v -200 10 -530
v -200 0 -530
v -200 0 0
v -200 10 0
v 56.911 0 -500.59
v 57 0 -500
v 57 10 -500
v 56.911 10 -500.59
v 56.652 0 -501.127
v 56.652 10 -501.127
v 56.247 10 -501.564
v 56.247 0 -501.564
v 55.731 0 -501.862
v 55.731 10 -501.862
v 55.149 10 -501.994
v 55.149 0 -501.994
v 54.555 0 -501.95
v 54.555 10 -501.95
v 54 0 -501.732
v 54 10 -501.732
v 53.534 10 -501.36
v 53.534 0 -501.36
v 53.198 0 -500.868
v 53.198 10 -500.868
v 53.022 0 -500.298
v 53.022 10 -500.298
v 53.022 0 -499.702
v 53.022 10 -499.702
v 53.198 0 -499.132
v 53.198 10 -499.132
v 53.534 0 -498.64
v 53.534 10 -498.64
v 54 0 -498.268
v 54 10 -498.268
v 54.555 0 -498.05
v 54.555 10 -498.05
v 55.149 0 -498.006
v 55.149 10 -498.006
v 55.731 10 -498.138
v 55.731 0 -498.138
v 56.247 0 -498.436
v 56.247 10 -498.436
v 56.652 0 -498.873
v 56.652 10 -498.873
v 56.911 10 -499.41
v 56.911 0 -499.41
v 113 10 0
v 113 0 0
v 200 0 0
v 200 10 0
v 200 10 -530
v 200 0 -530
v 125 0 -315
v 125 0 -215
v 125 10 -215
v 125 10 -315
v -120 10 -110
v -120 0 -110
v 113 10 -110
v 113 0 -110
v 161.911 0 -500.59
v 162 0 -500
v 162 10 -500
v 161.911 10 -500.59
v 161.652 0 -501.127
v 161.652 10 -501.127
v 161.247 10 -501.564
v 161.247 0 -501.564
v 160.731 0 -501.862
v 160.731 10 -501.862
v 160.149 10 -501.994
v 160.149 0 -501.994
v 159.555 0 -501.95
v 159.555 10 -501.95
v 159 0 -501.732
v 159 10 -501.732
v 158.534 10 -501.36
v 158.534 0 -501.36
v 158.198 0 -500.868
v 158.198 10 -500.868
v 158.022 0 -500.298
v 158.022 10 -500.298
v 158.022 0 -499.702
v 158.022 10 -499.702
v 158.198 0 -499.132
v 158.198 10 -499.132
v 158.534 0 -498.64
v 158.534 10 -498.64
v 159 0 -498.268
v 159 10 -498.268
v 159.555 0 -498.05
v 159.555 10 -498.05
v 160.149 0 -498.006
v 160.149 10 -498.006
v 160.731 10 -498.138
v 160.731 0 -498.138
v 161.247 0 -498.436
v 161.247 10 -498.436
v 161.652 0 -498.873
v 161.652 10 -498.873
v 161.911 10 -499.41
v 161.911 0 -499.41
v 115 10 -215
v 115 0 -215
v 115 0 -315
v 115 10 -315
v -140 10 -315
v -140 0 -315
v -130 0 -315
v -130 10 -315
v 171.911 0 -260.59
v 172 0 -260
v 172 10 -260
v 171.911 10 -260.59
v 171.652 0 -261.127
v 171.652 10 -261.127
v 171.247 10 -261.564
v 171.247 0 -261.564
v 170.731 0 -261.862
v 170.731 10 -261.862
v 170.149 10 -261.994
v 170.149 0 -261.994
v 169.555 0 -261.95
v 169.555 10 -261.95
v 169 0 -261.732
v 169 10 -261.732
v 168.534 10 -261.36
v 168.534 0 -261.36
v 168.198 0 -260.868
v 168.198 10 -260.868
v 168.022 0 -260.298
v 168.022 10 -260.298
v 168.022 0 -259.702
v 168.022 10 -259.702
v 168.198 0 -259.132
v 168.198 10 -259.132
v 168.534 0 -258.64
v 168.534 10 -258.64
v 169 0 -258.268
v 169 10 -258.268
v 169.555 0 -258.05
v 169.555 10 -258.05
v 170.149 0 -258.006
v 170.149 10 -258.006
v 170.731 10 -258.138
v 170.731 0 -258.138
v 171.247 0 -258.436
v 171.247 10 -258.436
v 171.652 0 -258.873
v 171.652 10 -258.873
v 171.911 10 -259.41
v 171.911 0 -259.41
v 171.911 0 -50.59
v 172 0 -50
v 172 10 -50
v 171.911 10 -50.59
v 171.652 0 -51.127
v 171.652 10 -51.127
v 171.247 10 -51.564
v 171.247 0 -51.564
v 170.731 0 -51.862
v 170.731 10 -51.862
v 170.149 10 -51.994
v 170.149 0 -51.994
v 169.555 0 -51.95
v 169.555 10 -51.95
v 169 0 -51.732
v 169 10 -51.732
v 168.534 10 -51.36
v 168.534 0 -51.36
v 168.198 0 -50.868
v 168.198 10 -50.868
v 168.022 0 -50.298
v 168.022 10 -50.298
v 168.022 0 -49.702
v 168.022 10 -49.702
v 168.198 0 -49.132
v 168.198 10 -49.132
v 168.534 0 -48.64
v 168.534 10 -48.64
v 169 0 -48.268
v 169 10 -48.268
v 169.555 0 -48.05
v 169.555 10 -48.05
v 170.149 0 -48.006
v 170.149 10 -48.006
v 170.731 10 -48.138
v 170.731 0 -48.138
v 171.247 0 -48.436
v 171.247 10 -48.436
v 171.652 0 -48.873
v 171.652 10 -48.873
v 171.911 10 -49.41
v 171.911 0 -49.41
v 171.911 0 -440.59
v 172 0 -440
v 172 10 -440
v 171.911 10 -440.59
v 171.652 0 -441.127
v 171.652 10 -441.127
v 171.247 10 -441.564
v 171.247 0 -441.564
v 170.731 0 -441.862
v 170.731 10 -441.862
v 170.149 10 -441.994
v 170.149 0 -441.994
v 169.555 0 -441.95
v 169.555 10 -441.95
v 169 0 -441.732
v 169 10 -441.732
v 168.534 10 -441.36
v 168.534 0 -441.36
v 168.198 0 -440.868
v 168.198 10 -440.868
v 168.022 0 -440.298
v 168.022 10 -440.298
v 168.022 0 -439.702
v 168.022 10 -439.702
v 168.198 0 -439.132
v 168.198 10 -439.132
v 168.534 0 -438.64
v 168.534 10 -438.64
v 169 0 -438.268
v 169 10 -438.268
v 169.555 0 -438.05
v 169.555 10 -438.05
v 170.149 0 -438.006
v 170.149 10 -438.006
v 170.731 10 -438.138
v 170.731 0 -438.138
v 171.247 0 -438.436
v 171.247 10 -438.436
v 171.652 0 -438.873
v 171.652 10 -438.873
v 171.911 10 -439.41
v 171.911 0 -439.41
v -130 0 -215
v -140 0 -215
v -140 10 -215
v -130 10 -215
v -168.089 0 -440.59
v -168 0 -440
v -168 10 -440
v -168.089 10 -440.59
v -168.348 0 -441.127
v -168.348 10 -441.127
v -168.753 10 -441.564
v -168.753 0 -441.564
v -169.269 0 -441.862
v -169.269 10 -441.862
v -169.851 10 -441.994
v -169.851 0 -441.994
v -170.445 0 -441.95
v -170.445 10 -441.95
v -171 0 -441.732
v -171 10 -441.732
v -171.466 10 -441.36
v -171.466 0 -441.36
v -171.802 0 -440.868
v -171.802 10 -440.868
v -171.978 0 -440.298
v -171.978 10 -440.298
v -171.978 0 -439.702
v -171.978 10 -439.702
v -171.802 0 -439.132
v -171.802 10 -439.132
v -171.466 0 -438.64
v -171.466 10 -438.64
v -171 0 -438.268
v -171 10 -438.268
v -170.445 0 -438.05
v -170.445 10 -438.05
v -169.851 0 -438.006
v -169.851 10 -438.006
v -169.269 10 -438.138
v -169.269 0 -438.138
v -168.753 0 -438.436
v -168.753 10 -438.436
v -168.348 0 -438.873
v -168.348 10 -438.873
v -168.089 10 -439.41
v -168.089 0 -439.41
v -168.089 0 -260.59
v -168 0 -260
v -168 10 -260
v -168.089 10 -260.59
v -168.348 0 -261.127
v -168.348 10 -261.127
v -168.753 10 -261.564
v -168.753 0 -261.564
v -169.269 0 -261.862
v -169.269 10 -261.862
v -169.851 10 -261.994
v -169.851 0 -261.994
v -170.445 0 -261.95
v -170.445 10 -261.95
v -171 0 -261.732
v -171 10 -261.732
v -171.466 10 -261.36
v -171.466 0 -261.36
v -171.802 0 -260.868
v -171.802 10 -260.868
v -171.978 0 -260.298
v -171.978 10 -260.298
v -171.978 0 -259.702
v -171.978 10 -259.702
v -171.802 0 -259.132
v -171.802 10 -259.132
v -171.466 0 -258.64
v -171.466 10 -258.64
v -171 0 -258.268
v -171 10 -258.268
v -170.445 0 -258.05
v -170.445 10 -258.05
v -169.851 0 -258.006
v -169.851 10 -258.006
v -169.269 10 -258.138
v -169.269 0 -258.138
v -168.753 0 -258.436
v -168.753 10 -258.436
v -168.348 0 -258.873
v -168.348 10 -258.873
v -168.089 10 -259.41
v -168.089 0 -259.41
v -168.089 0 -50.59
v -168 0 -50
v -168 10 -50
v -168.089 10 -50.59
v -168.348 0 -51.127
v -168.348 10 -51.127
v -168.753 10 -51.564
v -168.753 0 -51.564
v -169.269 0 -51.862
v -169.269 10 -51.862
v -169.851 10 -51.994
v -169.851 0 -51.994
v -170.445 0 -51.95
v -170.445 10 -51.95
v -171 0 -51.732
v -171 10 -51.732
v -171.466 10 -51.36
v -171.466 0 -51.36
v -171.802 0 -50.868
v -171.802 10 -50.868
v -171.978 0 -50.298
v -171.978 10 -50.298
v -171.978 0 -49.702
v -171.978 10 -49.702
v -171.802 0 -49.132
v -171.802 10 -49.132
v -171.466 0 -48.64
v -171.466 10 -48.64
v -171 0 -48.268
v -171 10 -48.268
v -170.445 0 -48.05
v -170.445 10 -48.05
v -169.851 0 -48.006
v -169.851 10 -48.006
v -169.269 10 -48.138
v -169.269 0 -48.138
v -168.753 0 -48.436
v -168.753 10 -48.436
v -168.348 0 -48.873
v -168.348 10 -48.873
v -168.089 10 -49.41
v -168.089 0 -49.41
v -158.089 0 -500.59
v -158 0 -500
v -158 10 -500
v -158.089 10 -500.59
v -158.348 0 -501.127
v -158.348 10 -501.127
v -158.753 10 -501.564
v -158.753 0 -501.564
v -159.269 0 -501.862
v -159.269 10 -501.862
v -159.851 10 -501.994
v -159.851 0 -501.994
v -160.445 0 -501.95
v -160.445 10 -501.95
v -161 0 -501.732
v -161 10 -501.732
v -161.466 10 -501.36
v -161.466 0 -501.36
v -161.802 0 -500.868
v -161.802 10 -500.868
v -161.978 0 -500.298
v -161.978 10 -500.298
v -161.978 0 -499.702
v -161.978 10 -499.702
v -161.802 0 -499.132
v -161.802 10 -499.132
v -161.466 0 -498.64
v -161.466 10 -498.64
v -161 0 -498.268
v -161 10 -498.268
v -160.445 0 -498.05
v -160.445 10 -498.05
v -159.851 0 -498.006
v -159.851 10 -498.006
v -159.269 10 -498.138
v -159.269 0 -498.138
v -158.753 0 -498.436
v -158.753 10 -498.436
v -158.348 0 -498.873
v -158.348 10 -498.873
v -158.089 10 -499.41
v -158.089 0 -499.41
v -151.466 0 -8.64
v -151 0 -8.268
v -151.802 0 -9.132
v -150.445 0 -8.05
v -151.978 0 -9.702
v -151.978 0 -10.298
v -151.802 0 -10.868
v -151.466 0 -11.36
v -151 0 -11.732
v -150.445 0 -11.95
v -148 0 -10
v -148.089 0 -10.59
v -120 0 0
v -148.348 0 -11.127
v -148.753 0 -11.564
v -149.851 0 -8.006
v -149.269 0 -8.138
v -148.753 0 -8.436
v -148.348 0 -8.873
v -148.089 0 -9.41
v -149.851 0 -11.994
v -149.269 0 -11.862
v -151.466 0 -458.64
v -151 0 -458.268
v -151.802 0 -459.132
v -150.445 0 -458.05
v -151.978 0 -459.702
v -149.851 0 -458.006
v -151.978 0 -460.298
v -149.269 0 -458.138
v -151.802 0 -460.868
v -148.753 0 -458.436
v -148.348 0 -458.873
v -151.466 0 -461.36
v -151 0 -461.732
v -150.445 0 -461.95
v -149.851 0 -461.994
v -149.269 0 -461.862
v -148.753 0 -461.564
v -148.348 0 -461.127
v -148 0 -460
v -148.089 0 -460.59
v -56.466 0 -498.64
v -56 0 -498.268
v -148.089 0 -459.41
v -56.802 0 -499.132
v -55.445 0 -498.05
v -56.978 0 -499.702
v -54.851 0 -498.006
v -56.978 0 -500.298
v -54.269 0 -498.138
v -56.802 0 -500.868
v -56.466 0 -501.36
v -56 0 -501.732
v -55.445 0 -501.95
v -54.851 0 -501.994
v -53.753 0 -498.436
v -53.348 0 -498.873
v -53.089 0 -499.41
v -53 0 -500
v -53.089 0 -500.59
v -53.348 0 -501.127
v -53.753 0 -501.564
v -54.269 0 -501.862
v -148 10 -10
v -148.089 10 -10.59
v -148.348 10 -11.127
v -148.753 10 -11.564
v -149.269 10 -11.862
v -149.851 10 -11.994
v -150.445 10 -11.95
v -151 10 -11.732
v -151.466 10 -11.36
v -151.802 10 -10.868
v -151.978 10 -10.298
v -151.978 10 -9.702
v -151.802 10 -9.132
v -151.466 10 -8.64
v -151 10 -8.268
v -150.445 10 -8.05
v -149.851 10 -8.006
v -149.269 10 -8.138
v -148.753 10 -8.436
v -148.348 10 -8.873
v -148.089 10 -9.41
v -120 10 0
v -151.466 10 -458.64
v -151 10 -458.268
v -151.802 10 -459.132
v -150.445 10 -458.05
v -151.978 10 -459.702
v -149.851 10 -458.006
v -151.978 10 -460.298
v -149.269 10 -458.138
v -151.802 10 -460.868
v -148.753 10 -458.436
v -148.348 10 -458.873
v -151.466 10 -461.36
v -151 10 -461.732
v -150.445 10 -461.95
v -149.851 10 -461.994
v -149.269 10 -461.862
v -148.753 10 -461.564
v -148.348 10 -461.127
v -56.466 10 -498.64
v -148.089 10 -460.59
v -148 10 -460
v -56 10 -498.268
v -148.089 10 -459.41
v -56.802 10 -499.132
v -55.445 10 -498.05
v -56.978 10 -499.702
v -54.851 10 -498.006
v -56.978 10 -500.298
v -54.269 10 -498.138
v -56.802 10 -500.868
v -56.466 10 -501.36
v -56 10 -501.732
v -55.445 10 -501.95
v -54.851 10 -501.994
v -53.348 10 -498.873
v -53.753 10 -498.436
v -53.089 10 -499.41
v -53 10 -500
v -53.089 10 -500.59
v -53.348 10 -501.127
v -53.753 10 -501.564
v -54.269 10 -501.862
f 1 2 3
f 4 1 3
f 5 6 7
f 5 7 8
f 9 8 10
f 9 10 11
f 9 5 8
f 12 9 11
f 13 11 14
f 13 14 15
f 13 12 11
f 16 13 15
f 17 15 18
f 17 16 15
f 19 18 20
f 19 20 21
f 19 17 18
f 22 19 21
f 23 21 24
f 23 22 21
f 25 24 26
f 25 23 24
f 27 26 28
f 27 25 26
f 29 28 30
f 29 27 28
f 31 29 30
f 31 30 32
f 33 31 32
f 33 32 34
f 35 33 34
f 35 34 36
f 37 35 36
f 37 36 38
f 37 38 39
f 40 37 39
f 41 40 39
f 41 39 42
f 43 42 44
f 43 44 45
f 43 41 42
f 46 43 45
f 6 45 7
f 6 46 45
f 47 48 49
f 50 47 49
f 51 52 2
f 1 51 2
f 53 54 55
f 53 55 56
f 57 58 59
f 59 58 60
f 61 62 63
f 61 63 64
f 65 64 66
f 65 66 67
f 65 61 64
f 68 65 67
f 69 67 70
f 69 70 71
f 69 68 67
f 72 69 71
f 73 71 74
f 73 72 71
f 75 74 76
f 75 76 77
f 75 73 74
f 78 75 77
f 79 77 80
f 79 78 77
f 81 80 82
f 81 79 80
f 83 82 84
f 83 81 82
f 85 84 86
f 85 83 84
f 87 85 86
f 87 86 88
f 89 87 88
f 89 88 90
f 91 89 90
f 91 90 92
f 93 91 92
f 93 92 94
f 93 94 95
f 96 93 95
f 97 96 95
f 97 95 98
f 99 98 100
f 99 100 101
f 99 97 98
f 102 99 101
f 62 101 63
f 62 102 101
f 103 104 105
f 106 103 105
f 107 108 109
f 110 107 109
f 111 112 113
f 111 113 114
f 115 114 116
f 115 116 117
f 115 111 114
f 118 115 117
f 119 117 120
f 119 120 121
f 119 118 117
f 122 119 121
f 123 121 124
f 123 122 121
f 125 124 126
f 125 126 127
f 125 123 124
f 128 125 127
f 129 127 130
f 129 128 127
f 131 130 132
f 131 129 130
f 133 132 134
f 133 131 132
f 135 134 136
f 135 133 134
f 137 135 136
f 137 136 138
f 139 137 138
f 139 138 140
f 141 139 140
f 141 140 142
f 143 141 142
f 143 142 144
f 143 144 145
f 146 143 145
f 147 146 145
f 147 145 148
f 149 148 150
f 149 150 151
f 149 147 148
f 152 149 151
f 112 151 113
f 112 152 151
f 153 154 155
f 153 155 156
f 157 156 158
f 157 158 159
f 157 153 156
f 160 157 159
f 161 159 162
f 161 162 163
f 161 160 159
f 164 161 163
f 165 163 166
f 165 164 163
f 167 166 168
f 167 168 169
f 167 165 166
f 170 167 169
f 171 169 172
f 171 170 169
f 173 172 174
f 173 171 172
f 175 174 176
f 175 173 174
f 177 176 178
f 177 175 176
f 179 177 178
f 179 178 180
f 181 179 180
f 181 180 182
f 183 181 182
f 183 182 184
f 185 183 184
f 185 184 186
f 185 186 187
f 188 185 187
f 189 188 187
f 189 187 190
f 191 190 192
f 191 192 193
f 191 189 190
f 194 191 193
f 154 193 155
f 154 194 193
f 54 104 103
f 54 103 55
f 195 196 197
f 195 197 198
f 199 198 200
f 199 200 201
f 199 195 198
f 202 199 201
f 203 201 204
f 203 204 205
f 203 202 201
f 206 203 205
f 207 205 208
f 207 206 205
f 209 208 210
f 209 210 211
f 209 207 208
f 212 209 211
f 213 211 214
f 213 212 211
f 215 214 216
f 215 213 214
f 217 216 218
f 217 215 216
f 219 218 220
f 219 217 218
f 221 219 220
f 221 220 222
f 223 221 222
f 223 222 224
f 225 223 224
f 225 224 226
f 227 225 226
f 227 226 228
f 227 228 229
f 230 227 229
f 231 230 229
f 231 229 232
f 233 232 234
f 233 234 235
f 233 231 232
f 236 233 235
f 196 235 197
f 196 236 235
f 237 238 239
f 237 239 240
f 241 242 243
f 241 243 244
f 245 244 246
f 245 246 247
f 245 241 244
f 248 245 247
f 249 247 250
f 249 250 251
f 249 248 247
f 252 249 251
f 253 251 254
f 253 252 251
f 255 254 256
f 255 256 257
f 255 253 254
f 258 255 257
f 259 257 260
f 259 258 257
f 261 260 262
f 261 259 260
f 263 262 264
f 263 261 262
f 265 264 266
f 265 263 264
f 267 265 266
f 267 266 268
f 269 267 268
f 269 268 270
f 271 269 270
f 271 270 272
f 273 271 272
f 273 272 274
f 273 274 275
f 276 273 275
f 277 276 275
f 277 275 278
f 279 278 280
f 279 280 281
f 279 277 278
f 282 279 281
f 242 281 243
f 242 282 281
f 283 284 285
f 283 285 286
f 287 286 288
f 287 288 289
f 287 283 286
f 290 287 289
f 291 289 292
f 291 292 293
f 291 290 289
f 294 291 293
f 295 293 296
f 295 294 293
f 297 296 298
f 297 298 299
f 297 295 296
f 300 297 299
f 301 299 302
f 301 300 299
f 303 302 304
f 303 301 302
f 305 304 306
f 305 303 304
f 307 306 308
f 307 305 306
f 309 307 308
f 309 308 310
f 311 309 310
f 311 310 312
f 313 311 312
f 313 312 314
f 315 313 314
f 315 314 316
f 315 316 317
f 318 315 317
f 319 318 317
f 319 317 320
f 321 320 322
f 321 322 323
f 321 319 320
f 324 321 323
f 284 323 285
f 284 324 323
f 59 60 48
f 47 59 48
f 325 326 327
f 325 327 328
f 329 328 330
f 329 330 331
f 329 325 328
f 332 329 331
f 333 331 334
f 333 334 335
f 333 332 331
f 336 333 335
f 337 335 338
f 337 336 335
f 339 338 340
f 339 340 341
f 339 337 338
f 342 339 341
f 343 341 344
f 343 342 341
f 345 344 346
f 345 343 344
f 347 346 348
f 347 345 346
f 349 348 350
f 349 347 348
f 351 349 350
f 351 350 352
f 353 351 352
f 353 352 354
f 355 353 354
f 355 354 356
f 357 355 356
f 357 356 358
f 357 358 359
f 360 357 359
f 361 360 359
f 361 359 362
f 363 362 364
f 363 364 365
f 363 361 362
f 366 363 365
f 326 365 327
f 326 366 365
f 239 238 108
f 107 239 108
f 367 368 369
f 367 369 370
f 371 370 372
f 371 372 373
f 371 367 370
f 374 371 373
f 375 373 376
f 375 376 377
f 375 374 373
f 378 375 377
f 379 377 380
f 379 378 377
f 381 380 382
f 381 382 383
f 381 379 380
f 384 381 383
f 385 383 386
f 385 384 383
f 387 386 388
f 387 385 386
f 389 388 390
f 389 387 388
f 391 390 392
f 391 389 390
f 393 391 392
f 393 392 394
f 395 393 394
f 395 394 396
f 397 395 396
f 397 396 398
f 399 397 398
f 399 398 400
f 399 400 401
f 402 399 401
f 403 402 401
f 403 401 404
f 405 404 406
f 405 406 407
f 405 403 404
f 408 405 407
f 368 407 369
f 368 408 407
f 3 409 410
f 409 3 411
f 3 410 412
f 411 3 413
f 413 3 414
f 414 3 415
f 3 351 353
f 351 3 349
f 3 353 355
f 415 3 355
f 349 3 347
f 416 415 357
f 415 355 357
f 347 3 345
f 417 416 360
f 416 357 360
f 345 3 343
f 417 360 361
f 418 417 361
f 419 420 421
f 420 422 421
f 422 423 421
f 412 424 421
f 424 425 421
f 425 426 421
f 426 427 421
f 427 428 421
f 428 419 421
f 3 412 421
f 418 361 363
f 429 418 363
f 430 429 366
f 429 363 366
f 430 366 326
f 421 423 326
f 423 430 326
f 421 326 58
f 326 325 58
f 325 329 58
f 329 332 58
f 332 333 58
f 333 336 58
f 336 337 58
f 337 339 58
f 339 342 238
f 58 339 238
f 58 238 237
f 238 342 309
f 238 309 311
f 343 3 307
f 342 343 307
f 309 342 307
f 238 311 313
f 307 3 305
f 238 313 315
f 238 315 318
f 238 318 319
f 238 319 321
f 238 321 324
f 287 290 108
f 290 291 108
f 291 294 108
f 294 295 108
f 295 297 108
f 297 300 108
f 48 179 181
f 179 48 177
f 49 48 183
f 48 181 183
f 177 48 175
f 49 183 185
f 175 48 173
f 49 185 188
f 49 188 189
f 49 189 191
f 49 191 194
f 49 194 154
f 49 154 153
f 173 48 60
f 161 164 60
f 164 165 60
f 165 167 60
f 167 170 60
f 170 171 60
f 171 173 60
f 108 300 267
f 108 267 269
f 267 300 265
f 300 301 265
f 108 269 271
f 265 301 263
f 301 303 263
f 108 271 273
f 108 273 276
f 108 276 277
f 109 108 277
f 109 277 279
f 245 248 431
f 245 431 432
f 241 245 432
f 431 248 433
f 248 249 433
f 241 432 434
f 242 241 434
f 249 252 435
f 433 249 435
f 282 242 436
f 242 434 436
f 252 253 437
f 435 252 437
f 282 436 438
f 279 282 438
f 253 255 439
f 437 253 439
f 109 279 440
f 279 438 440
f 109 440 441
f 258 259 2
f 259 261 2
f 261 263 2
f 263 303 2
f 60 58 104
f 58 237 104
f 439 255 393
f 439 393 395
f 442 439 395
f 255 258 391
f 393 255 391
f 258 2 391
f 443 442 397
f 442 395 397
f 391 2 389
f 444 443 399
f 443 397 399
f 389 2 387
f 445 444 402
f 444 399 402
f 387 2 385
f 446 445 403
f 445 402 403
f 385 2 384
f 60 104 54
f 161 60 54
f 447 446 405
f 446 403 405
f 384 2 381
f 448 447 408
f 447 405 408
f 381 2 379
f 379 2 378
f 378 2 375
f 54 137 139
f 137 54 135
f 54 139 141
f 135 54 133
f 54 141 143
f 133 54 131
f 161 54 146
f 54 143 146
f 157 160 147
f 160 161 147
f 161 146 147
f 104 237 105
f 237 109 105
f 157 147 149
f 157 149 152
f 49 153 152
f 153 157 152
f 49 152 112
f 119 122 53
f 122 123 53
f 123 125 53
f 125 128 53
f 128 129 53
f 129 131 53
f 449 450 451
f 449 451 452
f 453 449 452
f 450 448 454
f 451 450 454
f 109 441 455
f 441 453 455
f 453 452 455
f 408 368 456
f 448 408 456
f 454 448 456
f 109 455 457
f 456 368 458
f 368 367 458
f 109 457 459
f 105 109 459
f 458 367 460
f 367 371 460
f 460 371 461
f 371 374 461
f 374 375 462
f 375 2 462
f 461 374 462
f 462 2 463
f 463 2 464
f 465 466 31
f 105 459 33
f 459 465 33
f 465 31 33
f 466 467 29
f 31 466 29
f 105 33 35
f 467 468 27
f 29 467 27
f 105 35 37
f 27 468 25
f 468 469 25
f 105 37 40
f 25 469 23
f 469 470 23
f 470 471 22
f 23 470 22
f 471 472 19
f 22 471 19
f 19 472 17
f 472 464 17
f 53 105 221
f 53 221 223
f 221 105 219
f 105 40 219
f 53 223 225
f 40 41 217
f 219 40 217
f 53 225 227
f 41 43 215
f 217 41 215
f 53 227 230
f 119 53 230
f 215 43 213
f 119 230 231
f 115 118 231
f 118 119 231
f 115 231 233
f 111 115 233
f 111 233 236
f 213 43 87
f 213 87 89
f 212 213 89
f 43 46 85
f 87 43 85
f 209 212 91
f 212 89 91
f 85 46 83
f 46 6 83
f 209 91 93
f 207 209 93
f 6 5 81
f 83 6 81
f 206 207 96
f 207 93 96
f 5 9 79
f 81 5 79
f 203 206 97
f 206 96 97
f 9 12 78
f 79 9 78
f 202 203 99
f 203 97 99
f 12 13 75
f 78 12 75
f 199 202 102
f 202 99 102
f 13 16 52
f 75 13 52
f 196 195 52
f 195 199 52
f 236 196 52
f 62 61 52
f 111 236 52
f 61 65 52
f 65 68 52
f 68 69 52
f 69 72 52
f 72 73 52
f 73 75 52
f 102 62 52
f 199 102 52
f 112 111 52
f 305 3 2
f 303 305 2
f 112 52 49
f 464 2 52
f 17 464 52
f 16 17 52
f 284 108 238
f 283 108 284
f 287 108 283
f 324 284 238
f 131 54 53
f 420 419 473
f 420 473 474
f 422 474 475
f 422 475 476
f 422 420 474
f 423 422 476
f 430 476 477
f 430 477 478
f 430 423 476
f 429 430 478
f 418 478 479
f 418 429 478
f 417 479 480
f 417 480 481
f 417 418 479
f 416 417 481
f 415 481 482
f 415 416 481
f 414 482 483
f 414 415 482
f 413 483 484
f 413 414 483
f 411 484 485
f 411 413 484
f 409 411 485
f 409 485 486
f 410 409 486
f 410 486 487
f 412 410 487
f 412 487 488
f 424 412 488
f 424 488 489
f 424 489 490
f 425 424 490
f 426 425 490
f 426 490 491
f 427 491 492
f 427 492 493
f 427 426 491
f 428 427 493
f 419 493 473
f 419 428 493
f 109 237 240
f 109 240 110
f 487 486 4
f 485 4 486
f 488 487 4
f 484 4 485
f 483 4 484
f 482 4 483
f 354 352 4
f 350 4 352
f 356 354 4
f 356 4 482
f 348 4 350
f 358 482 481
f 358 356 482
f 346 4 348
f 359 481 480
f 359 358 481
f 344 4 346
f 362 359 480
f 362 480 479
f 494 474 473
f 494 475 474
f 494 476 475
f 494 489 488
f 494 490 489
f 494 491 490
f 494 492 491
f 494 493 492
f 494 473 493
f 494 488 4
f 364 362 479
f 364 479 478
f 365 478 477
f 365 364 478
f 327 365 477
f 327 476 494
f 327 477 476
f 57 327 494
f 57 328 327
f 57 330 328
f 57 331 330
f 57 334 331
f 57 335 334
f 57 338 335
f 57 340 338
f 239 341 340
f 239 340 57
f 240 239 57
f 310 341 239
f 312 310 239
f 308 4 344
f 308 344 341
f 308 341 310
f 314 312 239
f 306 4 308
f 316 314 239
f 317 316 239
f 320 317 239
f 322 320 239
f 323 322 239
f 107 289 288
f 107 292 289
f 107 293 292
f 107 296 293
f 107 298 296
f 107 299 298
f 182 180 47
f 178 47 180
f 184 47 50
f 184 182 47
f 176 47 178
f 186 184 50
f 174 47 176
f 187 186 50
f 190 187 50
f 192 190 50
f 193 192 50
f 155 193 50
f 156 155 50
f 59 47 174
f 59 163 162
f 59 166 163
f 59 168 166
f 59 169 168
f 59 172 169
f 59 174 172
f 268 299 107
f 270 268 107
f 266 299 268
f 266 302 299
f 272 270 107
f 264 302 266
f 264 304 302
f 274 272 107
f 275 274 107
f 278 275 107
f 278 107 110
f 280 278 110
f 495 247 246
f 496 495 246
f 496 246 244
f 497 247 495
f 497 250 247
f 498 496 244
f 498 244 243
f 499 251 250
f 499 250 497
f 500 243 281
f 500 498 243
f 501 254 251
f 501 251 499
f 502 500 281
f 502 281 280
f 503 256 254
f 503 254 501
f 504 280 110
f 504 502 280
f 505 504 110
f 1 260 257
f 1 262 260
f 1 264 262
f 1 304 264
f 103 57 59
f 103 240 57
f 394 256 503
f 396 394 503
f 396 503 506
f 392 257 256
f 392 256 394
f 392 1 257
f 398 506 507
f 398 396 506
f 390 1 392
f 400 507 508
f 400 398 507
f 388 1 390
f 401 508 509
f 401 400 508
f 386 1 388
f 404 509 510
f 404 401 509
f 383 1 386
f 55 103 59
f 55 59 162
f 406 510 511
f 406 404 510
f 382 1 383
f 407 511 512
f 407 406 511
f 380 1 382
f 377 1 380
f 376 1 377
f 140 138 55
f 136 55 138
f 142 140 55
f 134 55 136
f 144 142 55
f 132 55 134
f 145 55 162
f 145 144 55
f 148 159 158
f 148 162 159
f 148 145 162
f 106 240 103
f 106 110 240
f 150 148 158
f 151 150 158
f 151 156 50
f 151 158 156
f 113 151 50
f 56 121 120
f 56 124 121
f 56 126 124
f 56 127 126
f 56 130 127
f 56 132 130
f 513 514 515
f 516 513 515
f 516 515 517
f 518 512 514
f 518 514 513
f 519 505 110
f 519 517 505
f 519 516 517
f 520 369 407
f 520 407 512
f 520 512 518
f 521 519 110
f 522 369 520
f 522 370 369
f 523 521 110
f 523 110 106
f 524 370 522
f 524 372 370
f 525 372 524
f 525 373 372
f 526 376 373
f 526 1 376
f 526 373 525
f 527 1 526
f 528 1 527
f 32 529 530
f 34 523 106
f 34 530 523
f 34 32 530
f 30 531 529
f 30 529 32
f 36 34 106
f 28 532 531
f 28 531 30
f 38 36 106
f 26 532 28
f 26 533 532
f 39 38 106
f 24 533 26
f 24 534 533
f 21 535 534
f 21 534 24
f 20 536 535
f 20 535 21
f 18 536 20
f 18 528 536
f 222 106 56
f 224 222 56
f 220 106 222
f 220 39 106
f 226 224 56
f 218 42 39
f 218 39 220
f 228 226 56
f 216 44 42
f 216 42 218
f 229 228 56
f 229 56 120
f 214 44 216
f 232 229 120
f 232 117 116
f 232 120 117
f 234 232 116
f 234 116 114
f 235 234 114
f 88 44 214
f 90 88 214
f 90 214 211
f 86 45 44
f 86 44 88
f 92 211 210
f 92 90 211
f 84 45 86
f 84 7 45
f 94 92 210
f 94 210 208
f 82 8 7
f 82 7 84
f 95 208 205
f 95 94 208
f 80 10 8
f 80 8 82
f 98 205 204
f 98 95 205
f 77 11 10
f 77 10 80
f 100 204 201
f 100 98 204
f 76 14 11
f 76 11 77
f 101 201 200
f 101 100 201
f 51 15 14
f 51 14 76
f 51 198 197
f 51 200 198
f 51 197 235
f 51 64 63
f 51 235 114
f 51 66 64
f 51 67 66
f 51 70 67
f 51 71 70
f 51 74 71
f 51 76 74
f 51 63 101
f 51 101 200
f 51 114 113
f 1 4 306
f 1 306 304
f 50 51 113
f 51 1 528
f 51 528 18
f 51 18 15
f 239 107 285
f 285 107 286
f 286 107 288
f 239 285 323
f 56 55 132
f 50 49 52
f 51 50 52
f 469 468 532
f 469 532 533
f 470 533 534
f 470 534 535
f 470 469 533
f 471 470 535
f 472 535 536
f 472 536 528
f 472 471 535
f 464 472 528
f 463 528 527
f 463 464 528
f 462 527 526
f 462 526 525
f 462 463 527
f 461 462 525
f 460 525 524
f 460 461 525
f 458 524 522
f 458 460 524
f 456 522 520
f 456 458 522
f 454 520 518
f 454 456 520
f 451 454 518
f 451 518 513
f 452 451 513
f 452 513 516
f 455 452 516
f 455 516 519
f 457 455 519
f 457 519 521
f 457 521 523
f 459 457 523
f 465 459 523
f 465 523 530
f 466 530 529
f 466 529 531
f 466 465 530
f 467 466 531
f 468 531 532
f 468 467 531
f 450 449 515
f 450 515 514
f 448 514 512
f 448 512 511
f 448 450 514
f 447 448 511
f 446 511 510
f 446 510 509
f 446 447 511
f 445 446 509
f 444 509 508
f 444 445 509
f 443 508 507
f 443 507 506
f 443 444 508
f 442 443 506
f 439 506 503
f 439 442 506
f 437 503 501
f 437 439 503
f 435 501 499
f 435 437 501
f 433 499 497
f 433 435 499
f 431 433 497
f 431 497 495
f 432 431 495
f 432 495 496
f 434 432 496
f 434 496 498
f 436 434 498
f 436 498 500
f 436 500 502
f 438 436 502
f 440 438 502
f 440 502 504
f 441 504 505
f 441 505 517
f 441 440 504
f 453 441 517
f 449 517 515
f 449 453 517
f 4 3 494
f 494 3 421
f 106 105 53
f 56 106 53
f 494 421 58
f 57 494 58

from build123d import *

# Parameters (mm, degrees)
SKETCH1_R           = 2
SKETCH1_W           = 10
SKETCH1_H           = 100
BOSS_EXTRUDE1_DEPTH = 10


with BuildPart() as part:
    # Sketch1 → Boss-Extrude1 (new body)
    with BuildSketch(Plane(origin=(0, 0, 0), x_dir=(1, 0, 0), z_dir=(0, 1, 0))):
        Polygon((-200, 530), (-200, 0), (-120, 0), (-120, 110), (113, 110), (113, 0), (200, 0), (200, 530), align=None)
        with Locations((-160, 500)):
            Circle(SKETCH1_R, mode=Mode.SUBTRACT)
        with Locations((-55, 500)):
            Circle(SKETCH1_R, mode=Mode.SUBTRACT)
        with Locations((55, 500)):
            Circle(SKETCH1_R, mode=Mode.SUBTRACT)
        with Locations((160, 500)):
            Circle(SKETCH1_R, mode=Mode.SUBTRACT)
        with Locations((-170, 50)):
            Circle(SKETCH1_R, mode=Mode.SUBTRACT)
        with Locations((-170, 260)):
            Circle(SKETCH1_R, mode=Mode.SUBTRACT)
        with Locations((-170, 440)):
            Circle(SKETCH1_R, mode=Mode.SUBTRACT)
        with Locations((170, 440)):
            Circle(SKETCH1_R, mode=Mode.SUBTRACT)
        with Locations((170, 260)):
            Circle(SKETCH1_R, mode=Mode.SUBTRACT)
        with Locations((170, 50)):
            Circle(SKETCH1_R, mode=Mode.SUBTRACT)
        with Locations((-150, 10)):
            Circle(SKETCH1_R, mode=Mode.SUBTRACT)
        with Locations((-150, 460)):
            Circle(SKETCH1_R, mode=Mode.SUBTRACT)
        with Locations((-135, 265)):
            Rectangle(SKETCH1_W, SKETCH1_H, mode=Mode.SUBTRACT)
        with Locations((120, 265)):
            Rectangle(SKETCH1_W, SKETCH1_H, mode=Mode.SUBTRACT)
    extrude(amount=BOSS_EXTRUDE1_DEPTH)


solid = part.part
